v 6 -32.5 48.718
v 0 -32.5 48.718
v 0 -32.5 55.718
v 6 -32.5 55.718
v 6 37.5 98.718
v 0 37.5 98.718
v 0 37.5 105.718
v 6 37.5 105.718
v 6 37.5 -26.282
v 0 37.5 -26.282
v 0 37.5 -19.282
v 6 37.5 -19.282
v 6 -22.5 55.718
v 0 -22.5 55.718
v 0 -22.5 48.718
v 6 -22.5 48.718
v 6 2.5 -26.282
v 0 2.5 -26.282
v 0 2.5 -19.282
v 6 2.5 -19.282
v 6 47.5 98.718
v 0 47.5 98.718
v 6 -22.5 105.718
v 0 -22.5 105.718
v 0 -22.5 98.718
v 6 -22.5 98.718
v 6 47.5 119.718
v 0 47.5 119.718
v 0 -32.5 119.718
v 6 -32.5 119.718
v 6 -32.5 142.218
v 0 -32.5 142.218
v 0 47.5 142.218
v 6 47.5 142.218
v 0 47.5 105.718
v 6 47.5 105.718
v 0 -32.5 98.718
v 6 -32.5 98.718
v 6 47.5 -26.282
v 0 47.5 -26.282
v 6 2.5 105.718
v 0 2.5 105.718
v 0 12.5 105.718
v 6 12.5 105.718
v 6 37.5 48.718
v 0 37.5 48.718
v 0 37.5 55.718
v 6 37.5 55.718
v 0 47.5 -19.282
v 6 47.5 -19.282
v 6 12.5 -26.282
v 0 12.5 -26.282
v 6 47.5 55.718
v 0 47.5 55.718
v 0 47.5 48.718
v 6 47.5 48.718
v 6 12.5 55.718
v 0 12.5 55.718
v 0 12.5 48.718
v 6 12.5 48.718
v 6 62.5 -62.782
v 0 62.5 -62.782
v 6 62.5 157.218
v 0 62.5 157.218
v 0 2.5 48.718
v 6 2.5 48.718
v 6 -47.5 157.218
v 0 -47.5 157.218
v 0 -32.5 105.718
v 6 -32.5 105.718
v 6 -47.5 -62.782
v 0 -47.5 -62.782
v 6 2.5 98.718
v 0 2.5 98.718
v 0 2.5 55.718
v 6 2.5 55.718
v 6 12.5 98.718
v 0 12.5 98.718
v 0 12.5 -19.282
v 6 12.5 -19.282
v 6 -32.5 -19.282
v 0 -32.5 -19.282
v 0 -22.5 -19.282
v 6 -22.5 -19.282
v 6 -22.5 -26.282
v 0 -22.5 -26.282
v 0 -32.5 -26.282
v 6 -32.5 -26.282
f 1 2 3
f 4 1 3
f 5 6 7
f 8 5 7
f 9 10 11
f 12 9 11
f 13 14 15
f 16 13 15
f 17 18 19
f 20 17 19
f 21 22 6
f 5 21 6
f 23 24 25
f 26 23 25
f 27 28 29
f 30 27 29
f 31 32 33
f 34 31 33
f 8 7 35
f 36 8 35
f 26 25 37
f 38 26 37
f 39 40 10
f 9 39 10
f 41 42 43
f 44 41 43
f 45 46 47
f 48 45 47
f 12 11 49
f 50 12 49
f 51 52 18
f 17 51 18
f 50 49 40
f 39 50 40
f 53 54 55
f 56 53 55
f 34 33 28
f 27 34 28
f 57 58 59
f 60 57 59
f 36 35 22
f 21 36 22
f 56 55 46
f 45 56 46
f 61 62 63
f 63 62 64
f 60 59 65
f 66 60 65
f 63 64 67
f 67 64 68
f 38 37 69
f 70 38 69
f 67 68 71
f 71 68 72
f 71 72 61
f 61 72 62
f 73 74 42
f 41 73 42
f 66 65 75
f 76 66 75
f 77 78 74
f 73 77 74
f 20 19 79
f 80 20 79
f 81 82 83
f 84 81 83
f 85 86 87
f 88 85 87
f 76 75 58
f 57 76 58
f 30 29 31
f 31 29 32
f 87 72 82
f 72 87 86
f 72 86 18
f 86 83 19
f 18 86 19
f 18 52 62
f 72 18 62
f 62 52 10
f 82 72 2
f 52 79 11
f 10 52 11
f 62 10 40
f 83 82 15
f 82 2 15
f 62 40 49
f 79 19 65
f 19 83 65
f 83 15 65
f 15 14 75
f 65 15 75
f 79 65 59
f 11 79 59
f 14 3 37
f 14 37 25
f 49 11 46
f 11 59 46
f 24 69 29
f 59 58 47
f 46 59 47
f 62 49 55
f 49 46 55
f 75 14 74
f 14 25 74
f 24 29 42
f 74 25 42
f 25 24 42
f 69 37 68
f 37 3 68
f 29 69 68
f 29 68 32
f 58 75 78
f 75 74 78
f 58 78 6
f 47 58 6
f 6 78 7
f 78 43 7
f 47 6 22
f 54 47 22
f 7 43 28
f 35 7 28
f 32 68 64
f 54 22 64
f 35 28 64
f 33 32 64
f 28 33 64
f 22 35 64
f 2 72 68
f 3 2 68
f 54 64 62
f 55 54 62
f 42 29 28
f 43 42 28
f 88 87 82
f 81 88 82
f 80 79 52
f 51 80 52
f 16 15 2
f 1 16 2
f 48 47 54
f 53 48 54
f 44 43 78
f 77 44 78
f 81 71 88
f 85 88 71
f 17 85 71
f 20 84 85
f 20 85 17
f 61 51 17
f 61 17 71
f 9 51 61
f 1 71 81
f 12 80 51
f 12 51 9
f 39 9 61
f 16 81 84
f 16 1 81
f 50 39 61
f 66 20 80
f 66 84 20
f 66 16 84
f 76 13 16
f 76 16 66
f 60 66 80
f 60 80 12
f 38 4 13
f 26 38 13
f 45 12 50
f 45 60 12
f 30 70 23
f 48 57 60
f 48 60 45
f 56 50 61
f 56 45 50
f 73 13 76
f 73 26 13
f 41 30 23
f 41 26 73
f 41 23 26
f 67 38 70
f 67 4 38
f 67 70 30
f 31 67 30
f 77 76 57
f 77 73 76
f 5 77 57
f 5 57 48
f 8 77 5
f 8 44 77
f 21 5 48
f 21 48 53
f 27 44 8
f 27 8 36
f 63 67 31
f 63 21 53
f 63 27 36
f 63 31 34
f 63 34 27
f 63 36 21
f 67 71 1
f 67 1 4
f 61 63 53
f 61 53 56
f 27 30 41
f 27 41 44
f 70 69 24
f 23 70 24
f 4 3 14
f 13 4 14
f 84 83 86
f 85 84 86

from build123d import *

# Parameters (mm, degrees)
F1_DEPTH = 6


with BuildPart() as f1:
    # F0 (on Right) → F1 (new body)
    with BuildSketch(Plane.YZ):
        Polygon((9.433792, 157.218419), (-47.5, 157.218419), (-47.5, 130.369142), (-32.5, 130.369142), (-32.5, 142.218419), (9.433792, 142.218419), align=None)
        Polygon((62.5, 157.218419), (9.433792, 157.218419), (9.433792, 142.218419), (47.5, 142.218419), (47.5, 129.836887), (62.5, 129.836887), align=None)
        Polygon((-32.5, 130.369142), (-47.5, 130.369142), (-47.5, -62.781581), (62.5, -62.781581), (62.5, 129.836887), (47.5, 129.836887), (47.5, 119.718419), (-32.5, 119.718419), align=None)
        Polygon((-22.5, -19.281581), (-22.5, -22.781581), (-22.5, -26.281581), (-32.5, -26.281581), (-32.5, -19.281581), align=None, mode=Mode.SUBTRACT)
        Polygon((12.5, -19.281581), (12.5, -22.781581), (12.5, -26.281581), (2.5, -26.281581), (2.5, -22.781581), (2.5, -19.281581), align=None, mode=Mode.SUBTRACT)
        Polygon((37.5, -22.781581), (37.5, -19.281581), (47.5, -19.281581), (47.5, -26.281581), (37.5, -26.281581), align=None, mode=Mode.SUBTRACT)
        Polygon((-22.5, 55.718419), (-22.5, 52.218419), (-22.5, 48.718419), (-32.5, 48.718419), (-32.5, 55.718419), align=None, mode=Mode.SUBTRACT)
        Polygon((-22.5, 102.218419), (-22.5, 98.718419), (-32.5, 98.718419), (-32.5, 105.718419), (-22.5, 105.718419), align=None, mode=Mode.SUBTRACT)
        Polygon((12.5, 55.718419), (12.5, 52.218419), (12.5, 48.718419), (2.5, 48.718419), (2.5, 52.218419), (2.5, 55.718419), align=None, mode=Mode.SUBTRACT)
        Polygon((37.5, 52.218419), (37.5, 55.718419), (47.5, 55.718419), (47.5, 48.718419), (37.5, 48.718419), align=None, mode=Mode.SUBTRACT)
        Polygon((2.5, 98.718419), (2.5, 102.218419), (2.5, 105.718419), (12.5, 105.718419), (12.5, 102.218419), (12.5, 98.718419), align=None, mode=Mode.SUBTRACT)
        Polygon((37.5, 98.718419), (37.5, 102.218419), (37.5, 105.718419), (47.5, 105.718419), (47.5, 98.718419), align=None, mode=Mode.SUBTRACT)
    extrude(amount=F1_DEPTH)


solid = f1.part
